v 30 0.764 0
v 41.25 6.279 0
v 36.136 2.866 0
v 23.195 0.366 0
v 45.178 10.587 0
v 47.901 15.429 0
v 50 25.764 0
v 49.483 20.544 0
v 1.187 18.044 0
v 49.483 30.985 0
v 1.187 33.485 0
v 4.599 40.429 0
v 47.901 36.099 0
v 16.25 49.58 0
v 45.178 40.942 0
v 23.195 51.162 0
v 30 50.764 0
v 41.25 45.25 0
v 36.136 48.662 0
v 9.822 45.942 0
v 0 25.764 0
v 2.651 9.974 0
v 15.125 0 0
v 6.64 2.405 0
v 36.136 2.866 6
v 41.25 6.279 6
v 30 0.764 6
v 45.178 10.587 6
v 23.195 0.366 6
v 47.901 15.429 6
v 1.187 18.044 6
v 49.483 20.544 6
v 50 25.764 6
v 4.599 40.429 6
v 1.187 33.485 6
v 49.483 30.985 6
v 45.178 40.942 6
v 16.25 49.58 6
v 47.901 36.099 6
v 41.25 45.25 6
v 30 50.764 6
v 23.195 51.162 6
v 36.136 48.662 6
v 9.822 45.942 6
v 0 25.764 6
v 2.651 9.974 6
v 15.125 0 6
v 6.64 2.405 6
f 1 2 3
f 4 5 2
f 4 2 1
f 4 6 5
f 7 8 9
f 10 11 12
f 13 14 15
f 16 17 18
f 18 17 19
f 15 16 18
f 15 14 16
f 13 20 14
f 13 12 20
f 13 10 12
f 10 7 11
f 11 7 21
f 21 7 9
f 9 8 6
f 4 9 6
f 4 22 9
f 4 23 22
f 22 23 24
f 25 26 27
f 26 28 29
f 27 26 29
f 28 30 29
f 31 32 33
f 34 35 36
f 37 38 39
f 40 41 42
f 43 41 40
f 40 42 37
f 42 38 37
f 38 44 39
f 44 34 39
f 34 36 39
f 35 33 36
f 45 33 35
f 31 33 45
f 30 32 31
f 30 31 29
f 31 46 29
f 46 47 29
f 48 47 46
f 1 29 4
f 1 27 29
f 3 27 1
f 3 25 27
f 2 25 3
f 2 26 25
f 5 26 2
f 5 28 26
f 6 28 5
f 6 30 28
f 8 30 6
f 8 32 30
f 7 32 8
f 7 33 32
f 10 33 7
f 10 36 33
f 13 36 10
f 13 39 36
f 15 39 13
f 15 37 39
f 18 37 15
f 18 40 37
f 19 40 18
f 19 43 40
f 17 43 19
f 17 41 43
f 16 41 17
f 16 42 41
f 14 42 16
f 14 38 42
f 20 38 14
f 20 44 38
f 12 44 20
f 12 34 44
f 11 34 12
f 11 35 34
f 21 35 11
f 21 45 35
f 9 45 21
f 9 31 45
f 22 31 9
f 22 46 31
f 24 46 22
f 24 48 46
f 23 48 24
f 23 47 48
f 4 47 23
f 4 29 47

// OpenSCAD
$fn = 32;

// ----------------------------------------------------------------------
// Cam disc: base radius 20.0 mm, lift 10.0 mm, 24 profile points
// ----------------------------------------------------------------------

// --- parameters (mm) ---
profile_height = 6;       // extrusion height
profile_points = 24;      // points of the closed outline

profile = [[50, 25.764], [49.483, 30.985], [47.901, 36.099], [45.178, 40.942], [41.25, 45.25], [36.136, 48.662], [30, 50.764], [23.195, 51.162], [16.25, 49.58], [9.822, 45.942], [4.599, 40.429], [1.187, 33.485], [0, 25.764], [1.187, 18.044], [2.651, 9.974], [6.64, 2.405], [15.125, 0], [23.195, 0.366], [30, 0.764], [36.136, 2.866], [41.25, 6.279], [45.178, 10.587], [47.901, 15.429], [49.483, 20.544]];  // single closed polygon, 24 points, counter clockwise

// --- the one profile operation ---
linear_extrude(height = profile_height) polygon(points = profile);
